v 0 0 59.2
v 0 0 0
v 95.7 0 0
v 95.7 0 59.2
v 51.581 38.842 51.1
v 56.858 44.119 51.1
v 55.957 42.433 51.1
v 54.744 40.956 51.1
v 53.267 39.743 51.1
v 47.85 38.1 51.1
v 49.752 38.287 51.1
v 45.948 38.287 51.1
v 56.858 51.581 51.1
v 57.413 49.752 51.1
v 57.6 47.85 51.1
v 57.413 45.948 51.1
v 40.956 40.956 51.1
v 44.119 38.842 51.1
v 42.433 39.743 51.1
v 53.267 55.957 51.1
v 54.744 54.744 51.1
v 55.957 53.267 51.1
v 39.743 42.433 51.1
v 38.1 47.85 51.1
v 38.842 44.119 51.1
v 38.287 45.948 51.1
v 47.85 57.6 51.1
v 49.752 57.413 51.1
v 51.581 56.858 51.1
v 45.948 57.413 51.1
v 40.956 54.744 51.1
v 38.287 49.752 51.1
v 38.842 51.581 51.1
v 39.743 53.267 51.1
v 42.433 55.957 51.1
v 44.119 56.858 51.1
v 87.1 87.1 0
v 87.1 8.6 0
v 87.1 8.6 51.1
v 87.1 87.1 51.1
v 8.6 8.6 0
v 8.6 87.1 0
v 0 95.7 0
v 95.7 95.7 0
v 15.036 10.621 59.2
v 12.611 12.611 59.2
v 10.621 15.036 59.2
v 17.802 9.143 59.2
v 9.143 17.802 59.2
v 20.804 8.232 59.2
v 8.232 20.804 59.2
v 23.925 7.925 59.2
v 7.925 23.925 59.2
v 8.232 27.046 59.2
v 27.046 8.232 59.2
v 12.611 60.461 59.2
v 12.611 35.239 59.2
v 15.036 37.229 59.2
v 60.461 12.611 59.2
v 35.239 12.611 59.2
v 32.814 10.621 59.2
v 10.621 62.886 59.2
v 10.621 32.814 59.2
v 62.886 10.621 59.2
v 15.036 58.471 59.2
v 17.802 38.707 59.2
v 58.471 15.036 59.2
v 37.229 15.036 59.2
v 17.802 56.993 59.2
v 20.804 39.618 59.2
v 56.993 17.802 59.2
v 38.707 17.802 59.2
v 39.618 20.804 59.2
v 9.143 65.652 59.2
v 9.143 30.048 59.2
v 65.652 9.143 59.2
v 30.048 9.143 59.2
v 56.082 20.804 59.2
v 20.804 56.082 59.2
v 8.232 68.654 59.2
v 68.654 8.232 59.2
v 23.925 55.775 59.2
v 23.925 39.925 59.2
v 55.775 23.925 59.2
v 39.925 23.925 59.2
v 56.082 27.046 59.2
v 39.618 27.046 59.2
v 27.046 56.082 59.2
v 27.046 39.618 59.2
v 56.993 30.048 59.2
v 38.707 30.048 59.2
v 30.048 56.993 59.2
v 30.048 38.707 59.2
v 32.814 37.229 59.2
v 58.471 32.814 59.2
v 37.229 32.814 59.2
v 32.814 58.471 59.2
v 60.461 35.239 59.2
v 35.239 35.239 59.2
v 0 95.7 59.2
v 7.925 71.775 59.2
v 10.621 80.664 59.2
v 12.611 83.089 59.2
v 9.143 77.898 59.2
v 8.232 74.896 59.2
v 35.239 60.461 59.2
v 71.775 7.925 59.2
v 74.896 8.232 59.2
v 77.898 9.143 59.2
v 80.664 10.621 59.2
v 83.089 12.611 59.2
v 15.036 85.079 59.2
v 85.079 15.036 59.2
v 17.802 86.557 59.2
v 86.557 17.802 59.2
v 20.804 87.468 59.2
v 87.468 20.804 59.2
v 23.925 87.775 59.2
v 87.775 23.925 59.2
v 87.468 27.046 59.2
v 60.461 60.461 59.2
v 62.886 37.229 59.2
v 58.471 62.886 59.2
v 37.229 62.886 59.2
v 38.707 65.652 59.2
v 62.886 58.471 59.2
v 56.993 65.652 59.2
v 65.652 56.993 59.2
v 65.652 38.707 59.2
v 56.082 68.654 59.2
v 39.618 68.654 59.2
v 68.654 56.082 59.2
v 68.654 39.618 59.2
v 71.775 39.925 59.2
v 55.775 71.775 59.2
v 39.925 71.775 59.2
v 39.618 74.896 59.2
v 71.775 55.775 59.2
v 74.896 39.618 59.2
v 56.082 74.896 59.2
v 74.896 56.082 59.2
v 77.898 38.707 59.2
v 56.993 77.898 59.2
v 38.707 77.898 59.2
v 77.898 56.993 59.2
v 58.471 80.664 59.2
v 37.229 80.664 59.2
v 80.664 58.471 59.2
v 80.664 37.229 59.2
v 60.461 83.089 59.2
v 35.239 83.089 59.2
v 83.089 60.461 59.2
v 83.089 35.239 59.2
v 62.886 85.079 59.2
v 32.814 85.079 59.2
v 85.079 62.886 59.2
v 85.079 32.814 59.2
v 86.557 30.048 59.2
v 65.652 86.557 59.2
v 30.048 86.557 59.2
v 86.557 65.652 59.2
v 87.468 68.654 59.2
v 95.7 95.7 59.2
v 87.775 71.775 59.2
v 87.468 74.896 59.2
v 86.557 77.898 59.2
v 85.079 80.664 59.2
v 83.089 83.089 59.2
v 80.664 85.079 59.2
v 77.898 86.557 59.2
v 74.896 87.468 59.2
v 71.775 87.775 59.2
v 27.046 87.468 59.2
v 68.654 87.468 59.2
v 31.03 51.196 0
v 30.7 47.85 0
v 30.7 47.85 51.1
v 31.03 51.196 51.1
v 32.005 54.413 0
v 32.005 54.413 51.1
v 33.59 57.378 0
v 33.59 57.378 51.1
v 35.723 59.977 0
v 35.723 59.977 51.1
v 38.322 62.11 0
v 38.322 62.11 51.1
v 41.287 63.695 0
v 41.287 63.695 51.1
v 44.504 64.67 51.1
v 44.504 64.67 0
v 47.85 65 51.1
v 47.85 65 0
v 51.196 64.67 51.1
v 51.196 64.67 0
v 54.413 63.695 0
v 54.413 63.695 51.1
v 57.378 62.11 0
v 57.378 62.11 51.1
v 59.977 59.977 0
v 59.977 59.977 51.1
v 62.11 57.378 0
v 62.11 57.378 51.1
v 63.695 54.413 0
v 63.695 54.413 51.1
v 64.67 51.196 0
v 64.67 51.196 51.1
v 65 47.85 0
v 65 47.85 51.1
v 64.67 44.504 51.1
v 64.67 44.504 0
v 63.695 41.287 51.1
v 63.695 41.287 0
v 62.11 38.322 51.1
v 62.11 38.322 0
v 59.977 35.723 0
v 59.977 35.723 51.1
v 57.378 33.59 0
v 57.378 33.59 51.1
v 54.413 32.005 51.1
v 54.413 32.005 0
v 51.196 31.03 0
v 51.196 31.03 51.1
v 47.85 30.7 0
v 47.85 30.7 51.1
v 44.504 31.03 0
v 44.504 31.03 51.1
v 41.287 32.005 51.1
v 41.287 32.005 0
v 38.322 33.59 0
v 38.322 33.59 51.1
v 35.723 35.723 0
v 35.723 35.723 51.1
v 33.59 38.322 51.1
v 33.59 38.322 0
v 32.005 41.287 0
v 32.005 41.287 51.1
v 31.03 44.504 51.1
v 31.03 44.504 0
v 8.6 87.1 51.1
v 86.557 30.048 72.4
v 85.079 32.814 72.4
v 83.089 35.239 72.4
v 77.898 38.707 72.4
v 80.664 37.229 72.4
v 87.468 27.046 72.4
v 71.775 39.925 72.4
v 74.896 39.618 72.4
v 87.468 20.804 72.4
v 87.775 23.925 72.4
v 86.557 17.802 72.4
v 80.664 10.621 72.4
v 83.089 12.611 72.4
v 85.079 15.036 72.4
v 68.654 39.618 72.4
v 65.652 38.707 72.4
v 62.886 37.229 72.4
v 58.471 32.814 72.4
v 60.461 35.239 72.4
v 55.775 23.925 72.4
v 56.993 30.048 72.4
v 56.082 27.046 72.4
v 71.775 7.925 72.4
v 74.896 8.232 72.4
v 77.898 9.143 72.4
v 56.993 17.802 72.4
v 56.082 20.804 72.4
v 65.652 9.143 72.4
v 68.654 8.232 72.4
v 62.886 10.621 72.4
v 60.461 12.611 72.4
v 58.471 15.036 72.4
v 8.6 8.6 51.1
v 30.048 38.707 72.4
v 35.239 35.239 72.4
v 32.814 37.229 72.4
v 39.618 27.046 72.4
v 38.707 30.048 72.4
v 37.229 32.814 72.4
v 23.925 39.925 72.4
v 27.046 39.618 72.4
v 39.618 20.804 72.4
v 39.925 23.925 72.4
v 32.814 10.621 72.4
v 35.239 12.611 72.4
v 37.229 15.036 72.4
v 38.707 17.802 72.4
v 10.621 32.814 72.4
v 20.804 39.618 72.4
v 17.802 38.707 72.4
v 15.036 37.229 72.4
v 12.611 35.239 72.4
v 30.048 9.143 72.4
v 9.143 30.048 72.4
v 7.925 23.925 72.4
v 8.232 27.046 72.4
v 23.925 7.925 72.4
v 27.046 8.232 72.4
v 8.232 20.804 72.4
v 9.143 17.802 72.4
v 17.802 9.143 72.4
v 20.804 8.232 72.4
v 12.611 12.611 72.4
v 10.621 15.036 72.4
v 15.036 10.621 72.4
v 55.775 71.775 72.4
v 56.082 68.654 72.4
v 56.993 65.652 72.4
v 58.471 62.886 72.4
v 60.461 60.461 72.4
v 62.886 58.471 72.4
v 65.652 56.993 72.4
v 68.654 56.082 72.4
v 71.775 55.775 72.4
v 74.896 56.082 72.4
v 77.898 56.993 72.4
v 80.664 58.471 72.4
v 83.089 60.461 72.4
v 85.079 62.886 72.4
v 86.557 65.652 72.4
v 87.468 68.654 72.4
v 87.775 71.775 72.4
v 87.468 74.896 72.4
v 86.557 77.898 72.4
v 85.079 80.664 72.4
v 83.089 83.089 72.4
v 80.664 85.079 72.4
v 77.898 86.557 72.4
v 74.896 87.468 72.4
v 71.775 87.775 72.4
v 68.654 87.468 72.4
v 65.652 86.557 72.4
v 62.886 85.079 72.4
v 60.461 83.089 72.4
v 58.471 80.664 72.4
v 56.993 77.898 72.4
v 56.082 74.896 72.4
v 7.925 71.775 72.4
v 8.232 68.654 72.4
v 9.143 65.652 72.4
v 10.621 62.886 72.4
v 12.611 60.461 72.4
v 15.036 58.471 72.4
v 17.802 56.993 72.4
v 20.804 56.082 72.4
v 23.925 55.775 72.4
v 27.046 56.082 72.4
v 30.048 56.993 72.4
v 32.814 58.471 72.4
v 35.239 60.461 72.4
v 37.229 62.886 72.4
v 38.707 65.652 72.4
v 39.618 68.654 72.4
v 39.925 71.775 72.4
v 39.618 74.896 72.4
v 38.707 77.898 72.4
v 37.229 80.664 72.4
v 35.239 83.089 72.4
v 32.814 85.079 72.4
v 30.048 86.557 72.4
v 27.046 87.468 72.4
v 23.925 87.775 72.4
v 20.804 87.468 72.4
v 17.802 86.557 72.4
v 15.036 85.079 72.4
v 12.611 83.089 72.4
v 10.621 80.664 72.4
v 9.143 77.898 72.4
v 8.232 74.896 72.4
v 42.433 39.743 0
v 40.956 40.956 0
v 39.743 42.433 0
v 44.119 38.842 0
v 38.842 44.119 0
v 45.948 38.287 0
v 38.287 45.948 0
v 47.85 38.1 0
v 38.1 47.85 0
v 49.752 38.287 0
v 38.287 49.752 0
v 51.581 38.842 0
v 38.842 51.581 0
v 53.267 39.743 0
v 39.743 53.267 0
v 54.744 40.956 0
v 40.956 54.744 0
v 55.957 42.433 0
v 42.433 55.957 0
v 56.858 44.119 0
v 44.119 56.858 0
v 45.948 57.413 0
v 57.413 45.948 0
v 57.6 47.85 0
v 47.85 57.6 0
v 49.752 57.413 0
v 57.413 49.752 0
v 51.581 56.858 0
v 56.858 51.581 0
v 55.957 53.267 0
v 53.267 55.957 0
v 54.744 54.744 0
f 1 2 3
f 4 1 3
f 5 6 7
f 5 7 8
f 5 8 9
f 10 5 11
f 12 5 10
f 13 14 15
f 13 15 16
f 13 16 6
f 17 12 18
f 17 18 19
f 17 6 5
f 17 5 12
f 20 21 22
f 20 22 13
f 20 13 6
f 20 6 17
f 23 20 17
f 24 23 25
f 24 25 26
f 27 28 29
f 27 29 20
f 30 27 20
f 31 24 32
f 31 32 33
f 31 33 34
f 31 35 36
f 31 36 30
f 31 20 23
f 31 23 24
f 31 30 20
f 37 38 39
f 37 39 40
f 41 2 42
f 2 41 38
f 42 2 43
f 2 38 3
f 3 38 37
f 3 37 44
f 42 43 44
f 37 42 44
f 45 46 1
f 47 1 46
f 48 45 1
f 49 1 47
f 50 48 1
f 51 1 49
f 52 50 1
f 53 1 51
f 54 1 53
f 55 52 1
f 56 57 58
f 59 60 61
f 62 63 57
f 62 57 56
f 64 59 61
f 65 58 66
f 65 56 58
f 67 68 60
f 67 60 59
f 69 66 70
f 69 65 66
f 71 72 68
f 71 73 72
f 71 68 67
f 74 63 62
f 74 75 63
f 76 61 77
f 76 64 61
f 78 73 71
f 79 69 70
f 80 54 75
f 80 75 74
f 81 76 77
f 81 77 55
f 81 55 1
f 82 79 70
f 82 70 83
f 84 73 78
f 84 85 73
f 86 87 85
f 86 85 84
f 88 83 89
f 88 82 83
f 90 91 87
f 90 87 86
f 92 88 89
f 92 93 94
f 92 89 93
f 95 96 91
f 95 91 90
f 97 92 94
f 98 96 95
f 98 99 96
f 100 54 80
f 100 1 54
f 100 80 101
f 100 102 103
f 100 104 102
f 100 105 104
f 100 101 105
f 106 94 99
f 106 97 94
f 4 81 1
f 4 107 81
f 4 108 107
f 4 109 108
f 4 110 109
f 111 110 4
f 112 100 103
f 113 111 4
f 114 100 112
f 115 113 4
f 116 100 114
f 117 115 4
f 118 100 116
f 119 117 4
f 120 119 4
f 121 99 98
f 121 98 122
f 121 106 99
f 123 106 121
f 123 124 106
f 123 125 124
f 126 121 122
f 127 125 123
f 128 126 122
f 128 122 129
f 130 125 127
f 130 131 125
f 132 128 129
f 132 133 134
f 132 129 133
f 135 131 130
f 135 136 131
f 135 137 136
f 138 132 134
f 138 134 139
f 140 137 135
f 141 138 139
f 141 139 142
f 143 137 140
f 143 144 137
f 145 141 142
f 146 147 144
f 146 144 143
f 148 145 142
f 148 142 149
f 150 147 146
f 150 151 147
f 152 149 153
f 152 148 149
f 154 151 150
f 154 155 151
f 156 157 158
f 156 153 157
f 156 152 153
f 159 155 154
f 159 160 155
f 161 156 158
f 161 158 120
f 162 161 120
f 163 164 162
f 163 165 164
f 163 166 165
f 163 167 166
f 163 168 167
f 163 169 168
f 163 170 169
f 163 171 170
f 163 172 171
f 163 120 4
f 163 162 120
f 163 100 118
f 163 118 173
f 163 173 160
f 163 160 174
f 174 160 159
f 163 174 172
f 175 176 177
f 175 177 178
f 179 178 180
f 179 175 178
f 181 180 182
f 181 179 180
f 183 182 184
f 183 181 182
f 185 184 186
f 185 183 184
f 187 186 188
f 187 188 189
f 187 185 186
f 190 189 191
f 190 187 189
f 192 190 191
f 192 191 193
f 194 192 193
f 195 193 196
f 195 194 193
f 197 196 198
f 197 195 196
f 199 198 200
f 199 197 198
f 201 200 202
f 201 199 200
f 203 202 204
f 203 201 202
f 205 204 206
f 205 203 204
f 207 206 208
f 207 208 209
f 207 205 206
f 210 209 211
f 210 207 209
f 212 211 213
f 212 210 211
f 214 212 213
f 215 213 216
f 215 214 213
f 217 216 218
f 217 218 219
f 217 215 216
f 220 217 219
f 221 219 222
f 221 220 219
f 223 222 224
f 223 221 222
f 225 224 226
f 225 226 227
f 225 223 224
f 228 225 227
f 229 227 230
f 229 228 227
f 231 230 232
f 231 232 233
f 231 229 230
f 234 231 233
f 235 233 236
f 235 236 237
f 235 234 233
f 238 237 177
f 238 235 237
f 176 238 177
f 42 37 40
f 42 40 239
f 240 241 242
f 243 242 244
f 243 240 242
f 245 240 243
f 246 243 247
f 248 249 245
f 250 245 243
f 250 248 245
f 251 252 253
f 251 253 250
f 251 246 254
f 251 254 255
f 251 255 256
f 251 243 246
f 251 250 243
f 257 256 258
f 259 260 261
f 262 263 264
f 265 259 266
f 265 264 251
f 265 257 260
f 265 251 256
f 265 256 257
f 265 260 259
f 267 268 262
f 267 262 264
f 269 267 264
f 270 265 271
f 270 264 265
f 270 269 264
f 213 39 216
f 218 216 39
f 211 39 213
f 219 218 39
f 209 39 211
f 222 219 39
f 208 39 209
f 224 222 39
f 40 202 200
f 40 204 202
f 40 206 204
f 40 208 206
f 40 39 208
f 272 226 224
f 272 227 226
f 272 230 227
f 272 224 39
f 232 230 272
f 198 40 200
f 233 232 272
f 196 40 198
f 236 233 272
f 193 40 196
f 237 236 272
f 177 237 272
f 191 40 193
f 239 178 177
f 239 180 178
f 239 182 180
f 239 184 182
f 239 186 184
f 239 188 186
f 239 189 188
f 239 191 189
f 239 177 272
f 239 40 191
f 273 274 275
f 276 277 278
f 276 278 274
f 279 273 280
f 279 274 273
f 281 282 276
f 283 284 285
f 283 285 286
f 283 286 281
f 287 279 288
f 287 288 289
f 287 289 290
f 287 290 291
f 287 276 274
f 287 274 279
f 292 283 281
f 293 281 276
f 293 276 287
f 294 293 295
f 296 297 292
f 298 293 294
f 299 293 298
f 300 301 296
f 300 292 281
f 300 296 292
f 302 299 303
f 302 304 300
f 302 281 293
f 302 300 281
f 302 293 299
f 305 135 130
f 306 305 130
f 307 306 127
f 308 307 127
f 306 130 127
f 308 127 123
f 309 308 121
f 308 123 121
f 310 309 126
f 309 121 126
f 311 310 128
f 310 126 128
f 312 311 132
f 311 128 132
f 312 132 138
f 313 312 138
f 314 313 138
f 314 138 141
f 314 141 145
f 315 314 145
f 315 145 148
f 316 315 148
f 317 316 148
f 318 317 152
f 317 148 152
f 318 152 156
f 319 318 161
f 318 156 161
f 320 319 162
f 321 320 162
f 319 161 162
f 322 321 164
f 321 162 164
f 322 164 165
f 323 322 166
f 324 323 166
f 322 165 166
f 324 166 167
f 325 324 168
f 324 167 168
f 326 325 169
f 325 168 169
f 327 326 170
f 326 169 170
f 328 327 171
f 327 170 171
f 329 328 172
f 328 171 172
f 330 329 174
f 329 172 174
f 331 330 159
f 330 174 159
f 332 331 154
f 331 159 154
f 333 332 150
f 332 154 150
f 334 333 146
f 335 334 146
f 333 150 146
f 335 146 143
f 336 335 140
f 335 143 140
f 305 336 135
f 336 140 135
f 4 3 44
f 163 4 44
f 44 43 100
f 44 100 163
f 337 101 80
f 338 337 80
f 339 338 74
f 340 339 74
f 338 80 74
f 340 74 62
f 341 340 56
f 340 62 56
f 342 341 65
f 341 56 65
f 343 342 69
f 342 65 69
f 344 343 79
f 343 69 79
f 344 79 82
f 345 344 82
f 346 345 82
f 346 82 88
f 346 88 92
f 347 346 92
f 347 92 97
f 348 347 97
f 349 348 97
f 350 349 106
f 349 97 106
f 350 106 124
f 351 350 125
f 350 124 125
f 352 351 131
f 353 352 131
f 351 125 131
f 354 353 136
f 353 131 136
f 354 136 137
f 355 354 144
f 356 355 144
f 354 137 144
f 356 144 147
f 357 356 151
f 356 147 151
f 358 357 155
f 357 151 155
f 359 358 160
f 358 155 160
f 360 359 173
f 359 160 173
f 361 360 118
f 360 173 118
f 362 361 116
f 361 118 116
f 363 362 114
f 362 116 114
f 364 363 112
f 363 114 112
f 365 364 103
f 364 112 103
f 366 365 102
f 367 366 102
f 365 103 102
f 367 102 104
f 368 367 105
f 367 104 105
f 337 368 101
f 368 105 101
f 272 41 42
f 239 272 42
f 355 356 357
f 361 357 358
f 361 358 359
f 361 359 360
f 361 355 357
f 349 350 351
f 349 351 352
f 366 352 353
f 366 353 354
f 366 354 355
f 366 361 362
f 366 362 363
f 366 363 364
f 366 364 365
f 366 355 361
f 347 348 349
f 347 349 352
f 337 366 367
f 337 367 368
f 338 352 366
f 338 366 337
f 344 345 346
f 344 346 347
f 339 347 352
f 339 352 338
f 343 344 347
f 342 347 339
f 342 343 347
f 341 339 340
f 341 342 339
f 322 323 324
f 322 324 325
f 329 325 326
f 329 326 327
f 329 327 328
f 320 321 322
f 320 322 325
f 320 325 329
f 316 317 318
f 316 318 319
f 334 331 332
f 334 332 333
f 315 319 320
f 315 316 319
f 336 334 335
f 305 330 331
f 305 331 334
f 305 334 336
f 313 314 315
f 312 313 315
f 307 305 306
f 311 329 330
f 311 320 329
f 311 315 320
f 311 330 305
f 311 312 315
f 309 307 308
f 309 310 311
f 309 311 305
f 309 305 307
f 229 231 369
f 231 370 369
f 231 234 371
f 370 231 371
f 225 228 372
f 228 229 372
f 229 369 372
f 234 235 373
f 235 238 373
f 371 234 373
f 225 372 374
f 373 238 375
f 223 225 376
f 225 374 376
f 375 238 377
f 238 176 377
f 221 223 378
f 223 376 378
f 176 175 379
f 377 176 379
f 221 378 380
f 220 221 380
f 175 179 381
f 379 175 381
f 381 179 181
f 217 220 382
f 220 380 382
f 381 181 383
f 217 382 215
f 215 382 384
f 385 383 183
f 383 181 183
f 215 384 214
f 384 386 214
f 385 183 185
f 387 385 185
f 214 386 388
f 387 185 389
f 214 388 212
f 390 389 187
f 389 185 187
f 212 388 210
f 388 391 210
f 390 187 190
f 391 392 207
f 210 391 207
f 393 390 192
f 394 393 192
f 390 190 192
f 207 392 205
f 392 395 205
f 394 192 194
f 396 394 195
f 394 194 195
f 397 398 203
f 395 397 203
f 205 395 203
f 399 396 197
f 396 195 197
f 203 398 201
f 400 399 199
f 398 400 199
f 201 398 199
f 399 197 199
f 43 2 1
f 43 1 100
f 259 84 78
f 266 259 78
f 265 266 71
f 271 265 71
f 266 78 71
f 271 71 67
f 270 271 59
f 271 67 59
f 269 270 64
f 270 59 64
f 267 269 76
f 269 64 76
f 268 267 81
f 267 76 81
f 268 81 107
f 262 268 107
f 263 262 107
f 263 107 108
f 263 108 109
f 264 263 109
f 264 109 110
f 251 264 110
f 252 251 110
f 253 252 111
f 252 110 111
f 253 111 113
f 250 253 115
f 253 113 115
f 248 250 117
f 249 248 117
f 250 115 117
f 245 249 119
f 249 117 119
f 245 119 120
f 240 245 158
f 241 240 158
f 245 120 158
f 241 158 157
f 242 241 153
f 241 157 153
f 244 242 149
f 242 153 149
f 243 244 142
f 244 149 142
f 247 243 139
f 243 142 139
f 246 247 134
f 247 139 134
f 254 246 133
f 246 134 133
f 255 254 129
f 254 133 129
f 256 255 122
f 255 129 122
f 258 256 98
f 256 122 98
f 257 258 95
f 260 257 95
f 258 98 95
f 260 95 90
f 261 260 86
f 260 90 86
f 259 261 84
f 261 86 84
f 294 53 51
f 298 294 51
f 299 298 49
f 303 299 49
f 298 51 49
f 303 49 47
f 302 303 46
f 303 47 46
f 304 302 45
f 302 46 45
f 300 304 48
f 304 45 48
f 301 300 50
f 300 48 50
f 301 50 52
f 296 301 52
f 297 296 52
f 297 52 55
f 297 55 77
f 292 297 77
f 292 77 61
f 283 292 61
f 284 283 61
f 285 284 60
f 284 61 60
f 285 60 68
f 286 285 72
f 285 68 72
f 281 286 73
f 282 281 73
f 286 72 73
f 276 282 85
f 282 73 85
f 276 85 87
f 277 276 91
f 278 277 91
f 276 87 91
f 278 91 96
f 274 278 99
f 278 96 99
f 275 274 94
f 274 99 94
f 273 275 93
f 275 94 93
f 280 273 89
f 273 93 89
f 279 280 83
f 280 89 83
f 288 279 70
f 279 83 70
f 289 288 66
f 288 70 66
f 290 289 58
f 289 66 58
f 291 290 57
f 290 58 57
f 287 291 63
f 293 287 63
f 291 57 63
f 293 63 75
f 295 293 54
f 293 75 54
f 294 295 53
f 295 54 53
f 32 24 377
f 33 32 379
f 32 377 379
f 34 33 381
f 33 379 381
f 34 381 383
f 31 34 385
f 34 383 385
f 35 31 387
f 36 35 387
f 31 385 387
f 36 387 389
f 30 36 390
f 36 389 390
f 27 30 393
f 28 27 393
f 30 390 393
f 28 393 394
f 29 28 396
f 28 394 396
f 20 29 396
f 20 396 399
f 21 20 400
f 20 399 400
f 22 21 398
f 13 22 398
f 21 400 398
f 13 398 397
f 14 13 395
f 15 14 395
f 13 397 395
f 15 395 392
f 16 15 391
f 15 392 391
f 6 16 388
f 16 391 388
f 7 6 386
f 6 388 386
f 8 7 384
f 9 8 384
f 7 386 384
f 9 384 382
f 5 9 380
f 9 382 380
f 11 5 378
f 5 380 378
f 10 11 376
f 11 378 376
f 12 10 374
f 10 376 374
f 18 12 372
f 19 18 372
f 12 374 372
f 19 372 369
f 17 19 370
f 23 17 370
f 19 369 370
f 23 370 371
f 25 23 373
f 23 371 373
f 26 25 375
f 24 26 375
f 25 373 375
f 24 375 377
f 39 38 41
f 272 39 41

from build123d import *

# Parameters (mm, degrees)
ESQUISSE2_W             = 95.7
ESQUISSE2_H             = 95.7
BOSS_EXTRU_1_DEPTH      = 59.2
ESQUISSE3_R             = 16
BOSS_EXTRU_2_DEPTH      = 13.2
ESQUISSE4_W             = 78.5
ESQUISSE4_H             = 78.5
ESQUISSE4_R             = 17.15
ESQUISSE4_R_2           = 9.75
ENL_V_MAT_EXTRU_1_DEPTH = 51.1


with BuildPart() as part:
    # Esquisse2 → Boss.-Extru.1 (new body)
    with BuildSketch(Plane.XY):
        with Locations((47.85, 47.85)):
            Rectangle(ESQUISSE2_W, ESQUISSE2_H)
    extrude(amount=BOSS_EXTRU_1_DEPTH)

    # Esquisse3 → Boss.-Extru.2 (add)
    with BuildSketch(Plane.XY.offset(59.2)):
        with Locations(Location((23.925, 71.775, 0), (0, 0, 180))):
            Circle(ESQUISSE3_R)
        with Locations(Location((71.775, 71.775, 0), (0, 0, 180))):
            Circle(ESQUISSE3_R)
        with Locations(Location((71.775, 23.925, 0), (0, 0, 180))):
            Circle(ESQUISSE3_R)
        with Locations(Location((23.925, 23.925, 0), (0, 0, 180))):
            Circle(ESQUISSE3_R)
    extrude(amount=BOSS_EXTRU_2_DEPTH)

    # Esquisse4 → Enlèv. mat.-Extru.1 (cut)
    # profile 1 of 2: a face of its own
    with BuildSketch(Plane(origin=(0, 0, 0), x_dir=(-1, 0, 0), z_dir=(0, 0, -1))):
        with Locations((-47.85, 47.85)):
            Rectangle(ESQUISSE4_W, ESQUISSE4_H)
        with Locations((-47.85, 47.85)):
            Circle(ESQUISSE4_R, mode=Mode.SUBTRACT)
    # profile 2 of 2: a face of its own
    with BuildSketch(Plane(origin=(0, 0, 0), x_dir=(-1, 0, 0), z_dir=(0, 0, -1))):
        with Locations((-47.85, 47.85)):
            Circle(ESQUISSE4_R_2)
    extrude(amount=-ENL_V_MAT_EXTRU_1_DEPTH, mode=Mode.SUBTRACT)


solid = part.part
